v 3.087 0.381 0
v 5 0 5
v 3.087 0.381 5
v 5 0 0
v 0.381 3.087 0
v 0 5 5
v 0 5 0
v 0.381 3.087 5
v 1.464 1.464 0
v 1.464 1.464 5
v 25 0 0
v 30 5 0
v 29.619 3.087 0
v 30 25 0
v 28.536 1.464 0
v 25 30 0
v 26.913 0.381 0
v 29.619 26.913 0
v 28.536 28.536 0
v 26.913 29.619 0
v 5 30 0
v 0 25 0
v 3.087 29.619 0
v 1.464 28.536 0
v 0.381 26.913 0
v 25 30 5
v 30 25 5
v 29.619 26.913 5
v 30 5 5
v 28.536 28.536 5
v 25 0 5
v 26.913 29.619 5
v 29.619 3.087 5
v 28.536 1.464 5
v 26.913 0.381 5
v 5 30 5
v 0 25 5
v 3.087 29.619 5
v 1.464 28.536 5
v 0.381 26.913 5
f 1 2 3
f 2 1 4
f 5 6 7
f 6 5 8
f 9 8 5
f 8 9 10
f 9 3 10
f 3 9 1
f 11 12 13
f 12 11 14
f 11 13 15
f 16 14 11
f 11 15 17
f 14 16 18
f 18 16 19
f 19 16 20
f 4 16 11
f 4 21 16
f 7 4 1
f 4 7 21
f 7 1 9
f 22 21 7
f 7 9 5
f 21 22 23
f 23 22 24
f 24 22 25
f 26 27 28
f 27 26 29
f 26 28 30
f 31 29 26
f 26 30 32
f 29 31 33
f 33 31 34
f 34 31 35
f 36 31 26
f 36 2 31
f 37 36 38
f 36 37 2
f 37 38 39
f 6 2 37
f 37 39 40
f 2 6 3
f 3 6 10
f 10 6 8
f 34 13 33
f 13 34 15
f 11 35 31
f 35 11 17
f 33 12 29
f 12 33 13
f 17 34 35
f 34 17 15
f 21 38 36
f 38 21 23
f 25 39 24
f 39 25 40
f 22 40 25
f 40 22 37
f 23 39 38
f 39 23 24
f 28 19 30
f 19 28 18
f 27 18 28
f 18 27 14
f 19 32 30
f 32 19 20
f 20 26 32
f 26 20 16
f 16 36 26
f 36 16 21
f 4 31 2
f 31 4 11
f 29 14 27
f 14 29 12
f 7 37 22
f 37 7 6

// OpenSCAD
// The exact-geometry audit's case x03 (docs/audits/exact-geometry-rust.md).
// volume: 4392.699081698724
union() {
  translate([5,0,0]) cube([20,30,5]);
  translate([0,5,0]) cube([30,20,5]);
  for (p = [[5,5],[25,5],[5,25],[25,25]]) translate([p[0],p[1],0]) cylinder(r=5, h=5);
}
